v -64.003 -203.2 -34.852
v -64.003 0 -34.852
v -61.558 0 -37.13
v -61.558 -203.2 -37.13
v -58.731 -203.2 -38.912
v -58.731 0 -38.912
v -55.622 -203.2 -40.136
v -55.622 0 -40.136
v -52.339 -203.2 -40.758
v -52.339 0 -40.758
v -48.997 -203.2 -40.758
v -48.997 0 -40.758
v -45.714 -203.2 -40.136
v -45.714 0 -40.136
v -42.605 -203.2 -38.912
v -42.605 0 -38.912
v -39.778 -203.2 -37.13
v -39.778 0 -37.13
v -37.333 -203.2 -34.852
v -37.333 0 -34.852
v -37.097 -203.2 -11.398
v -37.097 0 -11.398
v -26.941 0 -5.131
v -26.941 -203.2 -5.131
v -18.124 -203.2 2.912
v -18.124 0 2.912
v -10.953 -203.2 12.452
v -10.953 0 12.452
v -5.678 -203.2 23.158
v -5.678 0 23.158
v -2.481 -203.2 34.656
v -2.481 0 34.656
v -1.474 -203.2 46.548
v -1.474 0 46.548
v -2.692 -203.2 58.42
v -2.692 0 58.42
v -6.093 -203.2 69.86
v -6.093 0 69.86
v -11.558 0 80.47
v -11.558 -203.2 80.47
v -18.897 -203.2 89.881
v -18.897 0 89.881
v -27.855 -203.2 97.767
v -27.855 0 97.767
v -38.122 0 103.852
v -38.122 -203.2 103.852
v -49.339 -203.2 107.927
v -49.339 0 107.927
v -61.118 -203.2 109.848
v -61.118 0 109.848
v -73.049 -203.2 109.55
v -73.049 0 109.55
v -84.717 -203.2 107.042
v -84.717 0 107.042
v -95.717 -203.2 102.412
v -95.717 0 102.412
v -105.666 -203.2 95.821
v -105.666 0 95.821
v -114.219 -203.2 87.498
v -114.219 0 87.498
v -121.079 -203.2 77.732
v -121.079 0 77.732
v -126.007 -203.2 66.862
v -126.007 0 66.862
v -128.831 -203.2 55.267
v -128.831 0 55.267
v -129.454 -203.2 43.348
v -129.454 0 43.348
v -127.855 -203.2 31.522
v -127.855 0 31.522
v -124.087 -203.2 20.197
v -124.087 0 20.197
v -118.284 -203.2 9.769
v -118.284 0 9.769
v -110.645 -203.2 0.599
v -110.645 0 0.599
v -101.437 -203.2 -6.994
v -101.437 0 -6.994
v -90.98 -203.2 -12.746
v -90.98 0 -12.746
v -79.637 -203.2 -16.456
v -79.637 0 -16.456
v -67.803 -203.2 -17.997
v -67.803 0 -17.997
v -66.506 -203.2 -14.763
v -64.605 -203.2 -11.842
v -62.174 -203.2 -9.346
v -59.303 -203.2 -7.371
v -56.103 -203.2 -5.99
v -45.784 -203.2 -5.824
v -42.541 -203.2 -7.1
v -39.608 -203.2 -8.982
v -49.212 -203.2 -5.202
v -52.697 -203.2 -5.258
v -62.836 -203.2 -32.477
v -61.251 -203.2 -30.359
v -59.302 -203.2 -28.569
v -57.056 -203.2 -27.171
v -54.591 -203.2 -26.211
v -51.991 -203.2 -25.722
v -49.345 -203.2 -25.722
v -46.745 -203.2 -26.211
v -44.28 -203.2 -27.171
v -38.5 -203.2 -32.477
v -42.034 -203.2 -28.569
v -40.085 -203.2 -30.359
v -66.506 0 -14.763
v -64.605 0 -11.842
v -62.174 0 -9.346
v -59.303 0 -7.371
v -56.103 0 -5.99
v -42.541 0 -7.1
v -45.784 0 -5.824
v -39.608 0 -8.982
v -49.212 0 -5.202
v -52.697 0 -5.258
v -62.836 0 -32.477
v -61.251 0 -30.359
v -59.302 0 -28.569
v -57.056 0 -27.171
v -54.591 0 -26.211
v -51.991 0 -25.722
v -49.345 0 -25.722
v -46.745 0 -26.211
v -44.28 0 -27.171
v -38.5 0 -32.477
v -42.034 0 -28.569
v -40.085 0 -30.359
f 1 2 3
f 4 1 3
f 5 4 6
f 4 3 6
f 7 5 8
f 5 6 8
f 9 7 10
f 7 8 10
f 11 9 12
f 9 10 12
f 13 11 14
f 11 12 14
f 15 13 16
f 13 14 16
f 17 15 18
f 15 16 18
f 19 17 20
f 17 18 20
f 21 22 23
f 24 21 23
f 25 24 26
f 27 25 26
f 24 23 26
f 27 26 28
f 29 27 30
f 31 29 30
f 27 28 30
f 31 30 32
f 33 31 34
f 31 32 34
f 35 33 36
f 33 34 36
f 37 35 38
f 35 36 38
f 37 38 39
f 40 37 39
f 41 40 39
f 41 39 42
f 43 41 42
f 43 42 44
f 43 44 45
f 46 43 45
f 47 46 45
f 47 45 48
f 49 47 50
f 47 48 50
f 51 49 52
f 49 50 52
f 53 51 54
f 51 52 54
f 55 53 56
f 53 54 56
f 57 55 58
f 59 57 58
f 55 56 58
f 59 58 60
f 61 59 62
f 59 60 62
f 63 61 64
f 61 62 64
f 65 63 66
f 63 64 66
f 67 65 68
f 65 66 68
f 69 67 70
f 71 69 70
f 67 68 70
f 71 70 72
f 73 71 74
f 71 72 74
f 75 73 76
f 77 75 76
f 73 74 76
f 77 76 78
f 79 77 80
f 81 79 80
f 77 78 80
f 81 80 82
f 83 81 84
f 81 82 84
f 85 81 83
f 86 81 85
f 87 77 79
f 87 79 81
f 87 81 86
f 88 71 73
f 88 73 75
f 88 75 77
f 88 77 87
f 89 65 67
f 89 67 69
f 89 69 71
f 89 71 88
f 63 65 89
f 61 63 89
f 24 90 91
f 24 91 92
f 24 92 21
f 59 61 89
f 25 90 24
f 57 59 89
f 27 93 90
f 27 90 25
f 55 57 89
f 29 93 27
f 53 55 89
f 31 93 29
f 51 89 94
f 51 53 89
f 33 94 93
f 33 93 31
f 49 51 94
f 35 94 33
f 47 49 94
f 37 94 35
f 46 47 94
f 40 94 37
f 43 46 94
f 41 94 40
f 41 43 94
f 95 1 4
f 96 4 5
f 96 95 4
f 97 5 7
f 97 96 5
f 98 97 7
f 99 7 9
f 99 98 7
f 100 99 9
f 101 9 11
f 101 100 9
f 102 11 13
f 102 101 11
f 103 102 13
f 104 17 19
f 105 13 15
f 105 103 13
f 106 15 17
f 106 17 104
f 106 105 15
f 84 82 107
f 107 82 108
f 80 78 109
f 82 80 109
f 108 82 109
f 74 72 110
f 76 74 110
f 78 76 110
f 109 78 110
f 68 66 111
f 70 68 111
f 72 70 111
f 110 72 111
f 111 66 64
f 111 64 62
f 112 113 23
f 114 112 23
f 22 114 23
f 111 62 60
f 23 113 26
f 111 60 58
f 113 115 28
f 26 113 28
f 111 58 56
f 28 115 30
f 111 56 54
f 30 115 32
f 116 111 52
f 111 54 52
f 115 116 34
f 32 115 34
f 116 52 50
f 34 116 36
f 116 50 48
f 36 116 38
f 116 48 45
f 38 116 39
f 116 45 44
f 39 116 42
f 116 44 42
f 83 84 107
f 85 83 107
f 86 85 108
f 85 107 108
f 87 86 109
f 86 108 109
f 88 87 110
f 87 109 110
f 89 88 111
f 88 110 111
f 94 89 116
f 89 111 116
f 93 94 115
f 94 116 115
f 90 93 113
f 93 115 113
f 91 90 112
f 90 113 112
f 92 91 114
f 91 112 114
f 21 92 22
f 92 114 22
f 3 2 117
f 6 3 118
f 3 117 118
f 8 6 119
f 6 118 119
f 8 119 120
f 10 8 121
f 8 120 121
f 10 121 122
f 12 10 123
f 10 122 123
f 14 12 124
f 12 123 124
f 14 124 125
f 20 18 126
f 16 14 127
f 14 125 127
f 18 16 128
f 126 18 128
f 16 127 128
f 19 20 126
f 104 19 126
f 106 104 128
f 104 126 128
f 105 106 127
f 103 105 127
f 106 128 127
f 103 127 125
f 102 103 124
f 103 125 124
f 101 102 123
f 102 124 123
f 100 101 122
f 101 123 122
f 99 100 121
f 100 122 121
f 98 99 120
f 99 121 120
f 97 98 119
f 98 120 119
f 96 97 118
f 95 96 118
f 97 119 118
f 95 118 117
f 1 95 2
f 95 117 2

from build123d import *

# Parameters (mm, degrees)
F1_DEPTH = 203.2


# Not quite as in the source:
# - a feature names something its author has since deleted; it is built from what else it names


with BuildPart() as f1:
    # F0 (on Front) → F1 (new body)
    with BuildSketch(Plane.XZ):
        with BuildLine():
            ThreePointArc((-67.802701422, -17.997257176), (-54.417922901, -5.5408285068), (-37.0972669354, -11.3982842828))
            ThreePointArc((-37.0972669354, -11.3982842828), (-78.9414112036, 108.5684996634), (-67.802701422, -17.997257176))
        make_face()
    extrude(amount=F1_DEPTH)


with BuildPart() as f1b:
    # F0 (on Front) → F1, piece 2 (new body)
    with BuildSketch(Plane.XZ):
        with BuildLine():
            ThreePointArc((-37.333307052, -34.8517759394), (-50.6679601967, -25.6607035221), (-64.0026133414, -34.8517759394))
            ThreePointArc((-64.0026133414, -34.8517759394), (-50.6679601967, -40.8368594944), (-37.333307052, -34.8517759394))
        make_face()
    extrude(amount=F1_DEPTH)


solid = Compound([f1.part, f1b.part])
